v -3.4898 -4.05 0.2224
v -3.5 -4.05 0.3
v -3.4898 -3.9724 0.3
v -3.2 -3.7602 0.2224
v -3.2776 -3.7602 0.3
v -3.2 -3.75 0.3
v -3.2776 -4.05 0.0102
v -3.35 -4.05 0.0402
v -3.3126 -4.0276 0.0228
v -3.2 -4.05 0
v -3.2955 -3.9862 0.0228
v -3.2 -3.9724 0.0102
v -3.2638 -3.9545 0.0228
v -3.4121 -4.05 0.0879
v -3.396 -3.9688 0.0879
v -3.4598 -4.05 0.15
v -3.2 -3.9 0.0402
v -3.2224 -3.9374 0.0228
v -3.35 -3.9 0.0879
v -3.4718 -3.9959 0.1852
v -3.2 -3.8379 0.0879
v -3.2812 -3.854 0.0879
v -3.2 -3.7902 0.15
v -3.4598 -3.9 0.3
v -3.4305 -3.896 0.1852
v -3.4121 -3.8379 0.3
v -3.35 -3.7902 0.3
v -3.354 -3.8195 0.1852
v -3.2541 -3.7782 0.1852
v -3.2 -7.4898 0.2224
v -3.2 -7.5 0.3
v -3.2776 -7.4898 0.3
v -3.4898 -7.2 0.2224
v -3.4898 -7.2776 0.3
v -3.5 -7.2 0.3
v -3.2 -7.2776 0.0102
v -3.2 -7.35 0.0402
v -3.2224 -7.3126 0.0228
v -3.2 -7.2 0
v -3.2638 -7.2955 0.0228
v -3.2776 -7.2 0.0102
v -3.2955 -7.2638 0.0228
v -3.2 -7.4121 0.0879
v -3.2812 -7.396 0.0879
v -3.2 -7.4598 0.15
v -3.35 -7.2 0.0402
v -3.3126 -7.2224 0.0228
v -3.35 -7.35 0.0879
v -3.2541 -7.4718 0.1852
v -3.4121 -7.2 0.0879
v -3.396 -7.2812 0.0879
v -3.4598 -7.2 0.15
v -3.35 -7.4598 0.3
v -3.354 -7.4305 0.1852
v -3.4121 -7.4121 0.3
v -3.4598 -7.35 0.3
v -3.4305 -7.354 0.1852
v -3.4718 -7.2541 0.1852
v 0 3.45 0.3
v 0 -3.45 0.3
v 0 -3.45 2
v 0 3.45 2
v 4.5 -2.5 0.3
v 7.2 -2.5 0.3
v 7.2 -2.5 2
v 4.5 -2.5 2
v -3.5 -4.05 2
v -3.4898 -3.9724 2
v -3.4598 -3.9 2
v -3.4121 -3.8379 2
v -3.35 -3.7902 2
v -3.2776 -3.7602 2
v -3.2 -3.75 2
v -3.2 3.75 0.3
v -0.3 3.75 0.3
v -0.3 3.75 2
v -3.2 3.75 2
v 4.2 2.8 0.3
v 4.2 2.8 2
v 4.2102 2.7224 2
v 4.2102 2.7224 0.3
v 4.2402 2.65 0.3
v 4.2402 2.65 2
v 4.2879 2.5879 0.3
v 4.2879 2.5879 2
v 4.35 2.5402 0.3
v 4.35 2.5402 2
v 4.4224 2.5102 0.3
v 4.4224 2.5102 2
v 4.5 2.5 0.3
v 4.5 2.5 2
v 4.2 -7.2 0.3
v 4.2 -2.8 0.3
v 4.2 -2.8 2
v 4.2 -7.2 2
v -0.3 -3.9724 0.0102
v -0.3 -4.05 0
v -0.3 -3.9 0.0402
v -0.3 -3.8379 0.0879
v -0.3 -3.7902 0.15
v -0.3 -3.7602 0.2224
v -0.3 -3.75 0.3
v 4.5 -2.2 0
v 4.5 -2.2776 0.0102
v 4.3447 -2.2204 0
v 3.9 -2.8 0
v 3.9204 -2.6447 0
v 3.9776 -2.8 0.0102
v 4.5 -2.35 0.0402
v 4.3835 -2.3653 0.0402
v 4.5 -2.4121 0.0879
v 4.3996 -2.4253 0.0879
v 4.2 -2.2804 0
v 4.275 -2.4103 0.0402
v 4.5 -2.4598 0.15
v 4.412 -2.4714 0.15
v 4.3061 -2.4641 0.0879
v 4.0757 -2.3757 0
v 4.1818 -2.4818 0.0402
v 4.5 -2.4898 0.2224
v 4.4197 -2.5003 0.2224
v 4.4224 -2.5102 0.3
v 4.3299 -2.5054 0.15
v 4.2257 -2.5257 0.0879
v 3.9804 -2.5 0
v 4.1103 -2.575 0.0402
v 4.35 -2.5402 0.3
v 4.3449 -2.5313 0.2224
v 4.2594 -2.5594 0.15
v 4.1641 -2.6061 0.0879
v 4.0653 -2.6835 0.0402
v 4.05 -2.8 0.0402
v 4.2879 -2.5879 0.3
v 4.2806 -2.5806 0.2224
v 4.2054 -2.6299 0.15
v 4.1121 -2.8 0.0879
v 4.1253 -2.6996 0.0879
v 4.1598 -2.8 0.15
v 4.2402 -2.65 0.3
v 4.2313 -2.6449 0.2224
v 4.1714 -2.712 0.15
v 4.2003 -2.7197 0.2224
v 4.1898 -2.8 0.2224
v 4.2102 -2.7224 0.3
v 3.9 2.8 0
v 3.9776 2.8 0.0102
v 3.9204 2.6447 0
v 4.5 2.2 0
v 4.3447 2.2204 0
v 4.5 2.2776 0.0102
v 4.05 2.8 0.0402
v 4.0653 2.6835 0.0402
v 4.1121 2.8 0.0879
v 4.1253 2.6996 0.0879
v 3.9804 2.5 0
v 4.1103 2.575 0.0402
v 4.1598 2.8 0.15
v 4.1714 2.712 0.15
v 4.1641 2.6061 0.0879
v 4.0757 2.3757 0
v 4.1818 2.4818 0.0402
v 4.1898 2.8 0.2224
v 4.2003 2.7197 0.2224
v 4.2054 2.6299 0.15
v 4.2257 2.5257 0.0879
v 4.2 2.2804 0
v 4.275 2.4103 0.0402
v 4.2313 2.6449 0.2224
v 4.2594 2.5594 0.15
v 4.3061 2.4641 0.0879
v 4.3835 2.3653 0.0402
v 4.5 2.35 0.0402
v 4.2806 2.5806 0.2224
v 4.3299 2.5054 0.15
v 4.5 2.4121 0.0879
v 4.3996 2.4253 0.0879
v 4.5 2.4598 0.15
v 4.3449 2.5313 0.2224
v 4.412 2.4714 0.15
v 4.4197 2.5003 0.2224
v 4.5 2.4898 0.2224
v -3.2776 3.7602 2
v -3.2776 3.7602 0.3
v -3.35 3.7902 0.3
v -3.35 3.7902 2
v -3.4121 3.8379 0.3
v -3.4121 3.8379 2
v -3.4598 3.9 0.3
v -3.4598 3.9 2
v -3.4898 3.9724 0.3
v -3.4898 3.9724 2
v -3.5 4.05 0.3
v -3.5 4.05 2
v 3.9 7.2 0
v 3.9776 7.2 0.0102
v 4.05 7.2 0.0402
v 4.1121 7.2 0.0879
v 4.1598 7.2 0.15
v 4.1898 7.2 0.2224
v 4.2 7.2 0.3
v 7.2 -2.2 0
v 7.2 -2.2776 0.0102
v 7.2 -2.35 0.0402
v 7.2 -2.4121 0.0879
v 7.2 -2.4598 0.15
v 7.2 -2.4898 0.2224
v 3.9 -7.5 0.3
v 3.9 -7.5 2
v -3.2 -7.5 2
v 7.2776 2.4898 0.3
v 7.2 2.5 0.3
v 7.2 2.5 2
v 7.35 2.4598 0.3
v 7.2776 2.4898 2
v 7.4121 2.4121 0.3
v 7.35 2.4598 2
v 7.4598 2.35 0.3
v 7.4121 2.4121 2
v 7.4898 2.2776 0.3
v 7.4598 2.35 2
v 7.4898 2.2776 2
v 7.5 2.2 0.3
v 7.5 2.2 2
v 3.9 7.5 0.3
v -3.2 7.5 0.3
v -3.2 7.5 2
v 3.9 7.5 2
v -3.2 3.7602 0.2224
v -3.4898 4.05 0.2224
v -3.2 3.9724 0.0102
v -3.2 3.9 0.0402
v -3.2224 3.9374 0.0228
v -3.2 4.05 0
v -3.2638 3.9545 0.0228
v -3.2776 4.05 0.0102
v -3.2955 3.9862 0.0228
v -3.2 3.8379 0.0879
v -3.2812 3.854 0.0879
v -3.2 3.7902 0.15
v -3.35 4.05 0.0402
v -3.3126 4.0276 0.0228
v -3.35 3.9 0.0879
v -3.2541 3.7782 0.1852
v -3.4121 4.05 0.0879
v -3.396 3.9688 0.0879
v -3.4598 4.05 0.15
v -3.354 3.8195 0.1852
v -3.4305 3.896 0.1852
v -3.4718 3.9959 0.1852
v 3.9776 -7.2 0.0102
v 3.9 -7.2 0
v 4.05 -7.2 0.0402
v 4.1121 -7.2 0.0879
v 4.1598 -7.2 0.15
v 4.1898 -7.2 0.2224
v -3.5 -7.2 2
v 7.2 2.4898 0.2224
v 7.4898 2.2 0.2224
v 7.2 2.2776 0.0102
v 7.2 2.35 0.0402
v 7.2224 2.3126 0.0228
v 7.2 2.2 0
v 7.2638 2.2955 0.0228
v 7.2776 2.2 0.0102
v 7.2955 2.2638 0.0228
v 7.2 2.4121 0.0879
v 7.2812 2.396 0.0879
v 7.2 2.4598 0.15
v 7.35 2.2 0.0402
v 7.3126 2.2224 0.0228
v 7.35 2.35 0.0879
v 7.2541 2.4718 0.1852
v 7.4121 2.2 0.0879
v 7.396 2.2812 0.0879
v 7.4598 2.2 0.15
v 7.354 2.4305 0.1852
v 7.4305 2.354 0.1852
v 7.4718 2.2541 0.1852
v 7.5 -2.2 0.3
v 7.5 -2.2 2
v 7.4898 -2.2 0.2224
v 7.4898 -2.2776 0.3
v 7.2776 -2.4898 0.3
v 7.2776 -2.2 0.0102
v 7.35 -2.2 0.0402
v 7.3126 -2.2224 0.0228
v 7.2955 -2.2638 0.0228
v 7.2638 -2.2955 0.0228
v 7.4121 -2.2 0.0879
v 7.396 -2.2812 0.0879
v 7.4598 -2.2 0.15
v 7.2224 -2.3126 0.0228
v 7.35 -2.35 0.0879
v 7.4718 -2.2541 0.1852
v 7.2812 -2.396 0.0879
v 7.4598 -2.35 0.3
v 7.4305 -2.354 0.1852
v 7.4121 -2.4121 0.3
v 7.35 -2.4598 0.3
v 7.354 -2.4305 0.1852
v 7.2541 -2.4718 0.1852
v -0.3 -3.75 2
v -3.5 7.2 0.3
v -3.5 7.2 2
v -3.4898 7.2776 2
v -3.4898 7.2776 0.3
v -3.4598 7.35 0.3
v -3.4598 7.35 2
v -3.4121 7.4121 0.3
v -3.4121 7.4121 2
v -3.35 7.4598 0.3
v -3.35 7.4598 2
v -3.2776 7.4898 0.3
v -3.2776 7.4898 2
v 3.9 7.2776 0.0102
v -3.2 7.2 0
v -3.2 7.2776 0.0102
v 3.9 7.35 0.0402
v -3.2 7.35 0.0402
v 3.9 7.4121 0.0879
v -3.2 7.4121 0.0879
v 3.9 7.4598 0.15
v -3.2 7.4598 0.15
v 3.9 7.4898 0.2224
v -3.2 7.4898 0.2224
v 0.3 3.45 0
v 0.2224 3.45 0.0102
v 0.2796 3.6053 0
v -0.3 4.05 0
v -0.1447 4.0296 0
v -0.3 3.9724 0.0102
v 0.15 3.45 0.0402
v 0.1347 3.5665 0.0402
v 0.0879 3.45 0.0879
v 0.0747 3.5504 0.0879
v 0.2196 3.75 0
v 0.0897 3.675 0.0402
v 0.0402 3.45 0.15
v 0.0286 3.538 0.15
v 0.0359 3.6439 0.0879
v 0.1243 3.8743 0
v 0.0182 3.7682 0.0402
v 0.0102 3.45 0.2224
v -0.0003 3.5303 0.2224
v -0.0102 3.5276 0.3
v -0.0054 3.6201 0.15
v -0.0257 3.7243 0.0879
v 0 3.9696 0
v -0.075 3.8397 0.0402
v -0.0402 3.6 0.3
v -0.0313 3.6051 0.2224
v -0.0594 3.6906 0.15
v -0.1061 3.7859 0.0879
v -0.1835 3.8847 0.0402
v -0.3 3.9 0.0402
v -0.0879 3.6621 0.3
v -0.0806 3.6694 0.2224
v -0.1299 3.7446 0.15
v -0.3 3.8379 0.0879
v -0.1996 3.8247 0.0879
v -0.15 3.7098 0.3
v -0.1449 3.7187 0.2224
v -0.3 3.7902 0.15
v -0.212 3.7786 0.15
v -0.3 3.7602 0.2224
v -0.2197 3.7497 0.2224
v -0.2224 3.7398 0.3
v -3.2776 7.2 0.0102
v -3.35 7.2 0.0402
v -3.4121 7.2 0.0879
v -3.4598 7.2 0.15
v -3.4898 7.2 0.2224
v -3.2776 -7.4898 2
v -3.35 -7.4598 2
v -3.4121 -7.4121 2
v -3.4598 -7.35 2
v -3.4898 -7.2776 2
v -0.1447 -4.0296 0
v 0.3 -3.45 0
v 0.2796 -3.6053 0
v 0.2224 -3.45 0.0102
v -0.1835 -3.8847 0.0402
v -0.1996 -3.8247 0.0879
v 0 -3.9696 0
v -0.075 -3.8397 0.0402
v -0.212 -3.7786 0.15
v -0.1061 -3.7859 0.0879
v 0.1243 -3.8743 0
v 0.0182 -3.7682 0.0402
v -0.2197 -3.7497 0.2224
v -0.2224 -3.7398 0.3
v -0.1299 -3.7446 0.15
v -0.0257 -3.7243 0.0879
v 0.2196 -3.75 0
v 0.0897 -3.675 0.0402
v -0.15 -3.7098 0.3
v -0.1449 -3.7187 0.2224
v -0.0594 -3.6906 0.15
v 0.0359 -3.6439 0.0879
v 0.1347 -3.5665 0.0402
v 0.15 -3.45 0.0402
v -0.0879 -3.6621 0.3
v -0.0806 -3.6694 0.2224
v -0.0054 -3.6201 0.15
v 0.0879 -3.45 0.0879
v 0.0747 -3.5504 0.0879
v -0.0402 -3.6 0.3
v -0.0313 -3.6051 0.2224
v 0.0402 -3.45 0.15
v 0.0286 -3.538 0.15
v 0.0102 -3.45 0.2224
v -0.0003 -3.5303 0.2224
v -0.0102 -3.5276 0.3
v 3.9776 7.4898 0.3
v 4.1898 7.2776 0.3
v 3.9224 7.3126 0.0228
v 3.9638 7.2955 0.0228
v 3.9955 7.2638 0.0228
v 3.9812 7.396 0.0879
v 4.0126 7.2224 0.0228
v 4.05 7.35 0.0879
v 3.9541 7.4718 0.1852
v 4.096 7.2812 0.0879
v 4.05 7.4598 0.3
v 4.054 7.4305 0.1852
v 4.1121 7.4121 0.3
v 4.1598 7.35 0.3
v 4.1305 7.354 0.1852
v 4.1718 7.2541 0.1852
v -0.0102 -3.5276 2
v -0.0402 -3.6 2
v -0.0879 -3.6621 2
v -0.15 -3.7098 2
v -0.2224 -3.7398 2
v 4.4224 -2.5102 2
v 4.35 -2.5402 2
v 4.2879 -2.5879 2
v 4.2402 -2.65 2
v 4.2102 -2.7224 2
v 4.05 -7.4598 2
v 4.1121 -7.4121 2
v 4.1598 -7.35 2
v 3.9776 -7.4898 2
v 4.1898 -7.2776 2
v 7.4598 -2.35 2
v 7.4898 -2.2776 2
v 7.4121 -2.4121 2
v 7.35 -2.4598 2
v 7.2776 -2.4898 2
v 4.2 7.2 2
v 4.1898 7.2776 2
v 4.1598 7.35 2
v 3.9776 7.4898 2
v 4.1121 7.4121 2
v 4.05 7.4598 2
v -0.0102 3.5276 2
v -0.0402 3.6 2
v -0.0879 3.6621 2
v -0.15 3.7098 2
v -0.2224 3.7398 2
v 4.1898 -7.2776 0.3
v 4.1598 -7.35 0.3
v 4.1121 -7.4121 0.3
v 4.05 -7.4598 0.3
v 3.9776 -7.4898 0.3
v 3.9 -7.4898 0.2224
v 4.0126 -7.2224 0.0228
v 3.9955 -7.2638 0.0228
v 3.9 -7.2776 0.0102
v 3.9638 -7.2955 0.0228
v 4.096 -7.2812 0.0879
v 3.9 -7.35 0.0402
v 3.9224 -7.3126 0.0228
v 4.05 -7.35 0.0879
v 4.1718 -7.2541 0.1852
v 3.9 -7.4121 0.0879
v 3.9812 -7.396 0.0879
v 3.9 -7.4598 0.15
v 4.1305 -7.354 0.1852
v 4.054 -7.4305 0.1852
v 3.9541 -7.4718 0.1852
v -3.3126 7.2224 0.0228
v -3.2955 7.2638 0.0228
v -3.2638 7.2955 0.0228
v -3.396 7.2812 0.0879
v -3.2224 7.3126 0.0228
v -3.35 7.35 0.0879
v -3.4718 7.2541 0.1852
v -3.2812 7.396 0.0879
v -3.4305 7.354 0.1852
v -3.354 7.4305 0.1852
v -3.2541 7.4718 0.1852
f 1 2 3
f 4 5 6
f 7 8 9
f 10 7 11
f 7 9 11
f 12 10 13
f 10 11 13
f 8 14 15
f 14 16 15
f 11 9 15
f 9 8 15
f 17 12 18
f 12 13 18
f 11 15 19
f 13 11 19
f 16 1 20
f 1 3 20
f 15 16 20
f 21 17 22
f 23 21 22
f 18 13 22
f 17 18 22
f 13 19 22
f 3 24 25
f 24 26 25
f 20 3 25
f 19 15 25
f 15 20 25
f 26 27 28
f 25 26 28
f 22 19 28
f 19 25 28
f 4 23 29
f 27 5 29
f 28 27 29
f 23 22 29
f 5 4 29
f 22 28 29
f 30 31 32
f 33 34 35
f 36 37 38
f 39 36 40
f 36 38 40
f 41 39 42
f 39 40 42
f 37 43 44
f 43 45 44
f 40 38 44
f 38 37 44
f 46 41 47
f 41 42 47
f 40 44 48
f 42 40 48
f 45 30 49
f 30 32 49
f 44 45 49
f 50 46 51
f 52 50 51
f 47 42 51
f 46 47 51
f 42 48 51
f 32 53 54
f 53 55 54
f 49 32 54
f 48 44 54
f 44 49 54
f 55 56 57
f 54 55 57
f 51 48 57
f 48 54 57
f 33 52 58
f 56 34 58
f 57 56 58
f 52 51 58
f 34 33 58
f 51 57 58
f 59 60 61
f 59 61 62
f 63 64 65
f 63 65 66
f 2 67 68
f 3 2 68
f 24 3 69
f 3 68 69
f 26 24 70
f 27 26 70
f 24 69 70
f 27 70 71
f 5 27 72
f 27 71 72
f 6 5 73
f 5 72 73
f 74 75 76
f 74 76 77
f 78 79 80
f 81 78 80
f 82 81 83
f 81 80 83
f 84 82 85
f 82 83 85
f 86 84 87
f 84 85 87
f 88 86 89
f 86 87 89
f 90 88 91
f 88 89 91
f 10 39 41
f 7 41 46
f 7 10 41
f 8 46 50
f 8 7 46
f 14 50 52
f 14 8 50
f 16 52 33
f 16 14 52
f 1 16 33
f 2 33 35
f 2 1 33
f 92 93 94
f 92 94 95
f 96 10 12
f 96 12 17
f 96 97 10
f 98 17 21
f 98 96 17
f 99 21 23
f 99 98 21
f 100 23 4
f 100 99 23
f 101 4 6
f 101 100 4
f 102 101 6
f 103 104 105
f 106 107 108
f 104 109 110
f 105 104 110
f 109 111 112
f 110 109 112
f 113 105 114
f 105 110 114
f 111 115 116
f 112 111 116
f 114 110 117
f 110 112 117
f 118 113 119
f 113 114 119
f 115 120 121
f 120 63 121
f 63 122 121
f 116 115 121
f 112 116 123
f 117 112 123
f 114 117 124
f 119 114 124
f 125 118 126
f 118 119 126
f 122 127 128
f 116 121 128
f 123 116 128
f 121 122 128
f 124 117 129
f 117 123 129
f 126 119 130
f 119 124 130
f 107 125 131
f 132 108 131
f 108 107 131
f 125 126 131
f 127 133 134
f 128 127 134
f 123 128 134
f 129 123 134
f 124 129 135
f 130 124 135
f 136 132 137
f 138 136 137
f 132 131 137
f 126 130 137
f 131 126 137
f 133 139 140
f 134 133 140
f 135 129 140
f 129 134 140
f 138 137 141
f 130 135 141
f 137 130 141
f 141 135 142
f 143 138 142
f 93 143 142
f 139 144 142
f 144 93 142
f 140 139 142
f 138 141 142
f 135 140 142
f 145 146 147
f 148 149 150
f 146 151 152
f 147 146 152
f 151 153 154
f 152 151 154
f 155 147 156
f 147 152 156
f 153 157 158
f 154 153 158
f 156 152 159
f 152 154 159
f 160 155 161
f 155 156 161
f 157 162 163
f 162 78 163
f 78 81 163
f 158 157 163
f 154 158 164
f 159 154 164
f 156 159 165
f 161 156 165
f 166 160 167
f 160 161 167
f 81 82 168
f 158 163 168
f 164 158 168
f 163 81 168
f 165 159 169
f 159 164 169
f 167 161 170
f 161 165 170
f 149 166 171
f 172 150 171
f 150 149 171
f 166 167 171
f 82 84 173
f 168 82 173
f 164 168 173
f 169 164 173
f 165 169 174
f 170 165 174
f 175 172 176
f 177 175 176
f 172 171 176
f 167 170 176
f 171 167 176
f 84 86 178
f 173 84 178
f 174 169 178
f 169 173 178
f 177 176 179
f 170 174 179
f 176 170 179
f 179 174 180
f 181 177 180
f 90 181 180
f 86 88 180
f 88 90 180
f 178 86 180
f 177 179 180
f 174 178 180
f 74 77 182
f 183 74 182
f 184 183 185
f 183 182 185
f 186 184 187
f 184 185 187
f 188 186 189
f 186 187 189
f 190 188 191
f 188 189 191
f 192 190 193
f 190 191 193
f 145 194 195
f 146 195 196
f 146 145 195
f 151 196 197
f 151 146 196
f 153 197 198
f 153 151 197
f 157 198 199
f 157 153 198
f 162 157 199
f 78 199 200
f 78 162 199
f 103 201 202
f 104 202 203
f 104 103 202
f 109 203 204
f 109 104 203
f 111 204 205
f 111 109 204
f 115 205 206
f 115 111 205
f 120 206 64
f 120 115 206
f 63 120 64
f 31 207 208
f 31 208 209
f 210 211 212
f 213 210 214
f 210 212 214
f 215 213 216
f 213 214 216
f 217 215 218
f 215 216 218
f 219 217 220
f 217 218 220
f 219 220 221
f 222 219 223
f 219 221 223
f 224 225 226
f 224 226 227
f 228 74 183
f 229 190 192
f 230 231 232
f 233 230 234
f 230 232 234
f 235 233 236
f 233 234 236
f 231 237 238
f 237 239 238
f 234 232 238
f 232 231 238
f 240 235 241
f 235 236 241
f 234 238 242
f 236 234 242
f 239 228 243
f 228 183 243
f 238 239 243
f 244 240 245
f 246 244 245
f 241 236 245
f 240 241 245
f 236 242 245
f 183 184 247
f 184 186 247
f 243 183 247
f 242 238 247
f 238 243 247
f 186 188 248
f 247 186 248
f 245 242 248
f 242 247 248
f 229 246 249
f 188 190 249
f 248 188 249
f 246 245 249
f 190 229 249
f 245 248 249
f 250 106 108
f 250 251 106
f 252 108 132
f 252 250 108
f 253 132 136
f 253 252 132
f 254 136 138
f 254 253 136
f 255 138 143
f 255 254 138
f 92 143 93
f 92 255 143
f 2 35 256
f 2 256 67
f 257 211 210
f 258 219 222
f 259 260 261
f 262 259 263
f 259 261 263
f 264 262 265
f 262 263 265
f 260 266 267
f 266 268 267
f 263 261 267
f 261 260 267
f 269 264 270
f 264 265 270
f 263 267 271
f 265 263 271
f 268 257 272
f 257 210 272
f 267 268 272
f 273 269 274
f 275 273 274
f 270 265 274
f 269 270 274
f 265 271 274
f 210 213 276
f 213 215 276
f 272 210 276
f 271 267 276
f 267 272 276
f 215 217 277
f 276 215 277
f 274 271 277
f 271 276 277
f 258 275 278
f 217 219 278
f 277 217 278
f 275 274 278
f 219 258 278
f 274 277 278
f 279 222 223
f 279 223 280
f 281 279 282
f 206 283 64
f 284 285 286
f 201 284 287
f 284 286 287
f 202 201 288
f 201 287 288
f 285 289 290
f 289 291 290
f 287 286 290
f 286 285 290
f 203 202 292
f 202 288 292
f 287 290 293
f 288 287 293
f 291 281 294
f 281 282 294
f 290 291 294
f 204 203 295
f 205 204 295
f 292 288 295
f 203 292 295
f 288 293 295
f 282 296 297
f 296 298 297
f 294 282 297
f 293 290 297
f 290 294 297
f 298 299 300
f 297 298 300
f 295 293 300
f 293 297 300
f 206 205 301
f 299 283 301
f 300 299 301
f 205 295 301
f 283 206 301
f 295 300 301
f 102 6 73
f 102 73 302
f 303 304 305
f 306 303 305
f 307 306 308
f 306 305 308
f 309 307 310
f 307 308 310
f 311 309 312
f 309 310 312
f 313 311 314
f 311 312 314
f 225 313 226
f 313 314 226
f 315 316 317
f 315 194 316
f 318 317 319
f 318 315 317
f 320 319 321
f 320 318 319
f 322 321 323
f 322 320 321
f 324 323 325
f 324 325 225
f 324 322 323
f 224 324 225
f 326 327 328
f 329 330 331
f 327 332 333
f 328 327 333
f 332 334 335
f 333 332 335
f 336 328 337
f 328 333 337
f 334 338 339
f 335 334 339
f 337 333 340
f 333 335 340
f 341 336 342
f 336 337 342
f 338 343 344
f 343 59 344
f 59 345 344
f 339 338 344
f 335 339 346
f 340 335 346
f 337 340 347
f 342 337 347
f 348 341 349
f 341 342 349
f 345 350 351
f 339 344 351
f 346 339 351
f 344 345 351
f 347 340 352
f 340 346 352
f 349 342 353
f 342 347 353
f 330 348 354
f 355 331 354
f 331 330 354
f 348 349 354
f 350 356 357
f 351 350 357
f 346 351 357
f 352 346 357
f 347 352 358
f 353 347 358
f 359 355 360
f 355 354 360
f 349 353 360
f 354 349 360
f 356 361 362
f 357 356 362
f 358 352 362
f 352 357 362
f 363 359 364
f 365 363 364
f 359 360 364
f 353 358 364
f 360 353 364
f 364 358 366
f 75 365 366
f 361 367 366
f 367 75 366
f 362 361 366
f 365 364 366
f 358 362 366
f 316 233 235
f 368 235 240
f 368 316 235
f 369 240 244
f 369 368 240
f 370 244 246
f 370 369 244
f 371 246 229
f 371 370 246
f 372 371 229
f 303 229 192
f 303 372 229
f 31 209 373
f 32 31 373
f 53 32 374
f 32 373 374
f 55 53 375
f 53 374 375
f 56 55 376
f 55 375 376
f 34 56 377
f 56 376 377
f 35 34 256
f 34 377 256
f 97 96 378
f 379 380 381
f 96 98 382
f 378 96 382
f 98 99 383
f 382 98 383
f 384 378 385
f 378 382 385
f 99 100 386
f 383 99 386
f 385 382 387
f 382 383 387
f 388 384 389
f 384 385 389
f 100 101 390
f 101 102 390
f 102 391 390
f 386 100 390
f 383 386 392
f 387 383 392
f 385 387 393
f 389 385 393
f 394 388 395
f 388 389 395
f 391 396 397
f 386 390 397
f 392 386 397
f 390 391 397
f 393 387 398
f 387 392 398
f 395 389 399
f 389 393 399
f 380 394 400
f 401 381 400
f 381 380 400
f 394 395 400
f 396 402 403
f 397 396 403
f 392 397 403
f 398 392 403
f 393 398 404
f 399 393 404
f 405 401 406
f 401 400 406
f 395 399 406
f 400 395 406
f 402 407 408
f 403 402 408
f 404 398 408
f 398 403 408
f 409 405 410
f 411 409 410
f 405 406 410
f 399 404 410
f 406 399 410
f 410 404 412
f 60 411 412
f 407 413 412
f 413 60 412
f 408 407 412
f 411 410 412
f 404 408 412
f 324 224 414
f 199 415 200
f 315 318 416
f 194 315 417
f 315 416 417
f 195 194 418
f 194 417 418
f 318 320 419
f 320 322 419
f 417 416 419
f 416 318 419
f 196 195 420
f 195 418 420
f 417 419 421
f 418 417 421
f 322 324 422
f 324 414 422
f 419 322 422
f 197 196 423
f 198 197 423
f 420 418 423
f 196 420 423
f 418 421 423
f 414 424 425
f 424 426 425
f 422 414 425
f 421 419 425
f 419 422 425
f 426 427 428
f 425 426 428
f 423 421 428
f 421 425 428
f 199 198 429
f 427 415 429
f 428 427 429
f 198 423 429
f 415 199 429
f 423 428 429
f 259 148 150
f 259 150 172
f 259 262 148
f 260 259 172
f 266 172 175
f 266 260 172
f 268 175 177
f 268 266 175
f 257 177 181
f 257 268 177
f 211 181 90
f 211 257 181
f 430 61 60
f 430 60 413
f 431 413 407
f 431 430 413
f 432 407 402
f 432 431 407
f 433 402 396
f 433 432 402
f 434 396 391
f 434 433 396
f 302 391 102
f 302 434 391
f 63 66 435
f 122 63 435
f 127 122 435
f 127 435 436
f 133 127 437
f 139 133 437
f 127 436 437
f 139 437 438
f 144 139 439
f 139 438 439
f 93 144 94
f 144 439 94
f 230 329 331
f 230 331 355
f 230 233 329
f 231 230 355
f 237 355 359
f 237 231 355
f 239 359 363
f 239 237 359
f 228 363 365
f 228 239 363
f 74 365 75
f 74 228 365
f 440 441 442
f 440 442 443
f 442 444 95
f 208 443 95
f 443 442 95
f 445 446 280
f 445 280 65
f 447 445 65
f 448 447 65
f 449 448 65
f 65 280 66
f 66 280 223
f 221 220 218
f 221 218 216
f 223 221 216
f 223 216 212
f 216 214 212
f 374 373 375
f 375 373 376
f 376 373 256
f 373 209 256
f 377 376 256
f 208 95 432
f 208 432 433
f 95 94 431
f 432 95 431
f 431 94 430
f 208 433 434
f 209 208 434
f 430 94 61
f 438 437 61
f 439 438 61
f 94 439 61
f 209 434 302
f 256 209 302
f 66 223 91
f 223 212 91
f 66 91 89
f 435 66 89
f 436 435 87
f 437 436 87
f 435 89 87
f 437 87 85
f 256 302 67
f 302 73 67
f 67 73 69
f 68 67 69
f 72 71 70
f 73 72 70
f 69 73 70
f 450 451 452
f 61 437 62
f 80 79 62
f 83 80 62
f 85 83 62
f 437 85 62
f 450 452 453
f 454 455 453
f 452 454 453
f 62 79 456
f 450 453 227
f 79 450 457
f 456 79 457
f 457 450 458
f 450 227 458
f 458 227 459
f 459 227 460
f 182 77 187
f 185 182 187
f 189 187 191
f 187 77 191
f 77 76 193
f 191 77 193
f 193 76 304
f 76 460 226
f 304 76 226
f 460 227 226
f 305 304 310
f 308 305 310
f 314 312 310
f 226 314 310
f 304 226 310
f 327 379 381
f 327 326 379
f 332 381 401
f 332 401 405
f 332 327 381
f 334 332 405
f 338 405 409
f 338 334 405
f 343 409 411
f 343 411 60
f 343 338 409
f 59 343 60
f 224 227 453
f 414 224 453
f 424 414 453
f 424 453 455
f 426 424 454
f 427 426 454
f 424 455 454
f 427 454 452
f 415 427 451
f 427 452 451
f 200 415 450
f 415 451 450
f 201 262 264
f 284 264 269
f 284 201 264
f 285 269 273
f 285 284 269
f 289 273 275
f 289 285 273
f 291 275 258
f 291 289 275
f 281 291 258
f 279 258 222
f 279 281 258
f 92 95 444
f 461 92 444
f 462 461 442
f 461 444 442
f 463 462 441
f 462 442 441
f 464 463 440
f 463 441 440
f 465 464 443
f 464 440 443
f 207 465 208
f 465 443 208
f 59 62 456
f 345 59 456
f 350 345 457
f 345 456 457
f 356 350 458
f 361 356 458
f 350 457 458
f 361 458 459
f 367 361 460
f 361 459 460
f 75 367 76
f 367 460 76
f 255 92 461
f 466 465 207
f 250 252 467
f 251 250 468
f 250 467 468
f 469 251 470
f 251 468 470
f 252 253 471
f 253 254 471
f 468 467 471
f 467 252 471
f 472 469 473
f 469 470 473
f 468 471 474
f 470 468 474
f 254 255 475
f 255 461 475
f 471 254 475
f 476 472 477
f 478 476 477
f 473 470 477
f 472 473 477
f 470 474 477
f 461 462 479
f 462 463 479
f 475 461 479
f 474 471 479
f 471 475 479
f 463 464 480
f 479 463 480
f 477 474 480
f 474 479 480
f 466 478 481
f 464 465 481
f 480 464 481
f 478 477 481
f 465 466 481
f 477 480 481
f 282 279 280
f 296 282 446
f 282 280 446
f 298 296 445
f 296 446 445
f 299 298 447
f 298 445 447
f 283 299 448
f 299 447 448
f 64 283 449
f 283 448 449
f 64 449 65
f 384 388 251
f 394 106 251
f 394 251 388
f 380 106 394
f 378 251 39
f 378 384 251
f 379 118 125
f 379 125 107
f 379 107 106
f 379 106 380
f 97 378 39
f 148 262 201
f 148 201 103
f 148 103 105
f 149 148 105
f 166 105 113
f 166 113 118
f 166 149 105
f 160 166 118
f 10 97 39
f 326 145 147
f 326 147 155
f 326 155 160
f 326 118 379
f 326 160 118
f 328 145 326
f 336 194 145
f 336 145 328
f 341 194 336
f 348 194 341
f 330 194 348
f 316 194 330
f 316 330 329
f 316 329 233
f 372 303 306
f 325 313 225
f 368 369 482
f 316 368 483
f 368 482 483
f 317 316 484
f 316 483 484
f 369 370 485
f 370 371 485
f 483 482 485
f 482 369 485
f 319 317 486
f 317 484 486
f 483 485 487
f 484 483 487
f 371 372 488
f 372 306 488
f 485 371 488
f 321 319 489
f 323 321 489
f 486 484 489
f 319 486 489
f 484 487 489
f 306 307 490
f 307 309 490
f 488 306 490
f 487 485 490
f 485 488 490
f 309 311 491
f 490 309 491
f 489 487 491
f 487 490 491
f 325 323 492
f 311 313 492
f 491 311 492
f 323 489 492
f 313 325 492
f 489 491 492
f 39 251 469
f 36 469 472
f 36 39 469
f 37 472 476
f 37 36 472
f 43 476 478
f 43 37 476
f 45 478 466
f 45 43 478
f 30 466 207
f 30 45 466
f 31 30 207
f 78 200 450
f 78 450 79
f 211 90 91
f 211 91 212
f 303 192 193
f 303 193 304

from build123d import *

# Parameters (mm, degrees)
GRUNDK_RPER_DEPTH = 2
VERRUNDUNG1_R     = 0.3
VERRUNDUNG2_R     = 0.3


with BuildPart() as part:
    # Skizze1 → Grundkörper (new body)
    with BuildSketch(Plane.XY):
        Polygon((0, -3.75), (0, 3.75), (-3.5, 3.75), (-3.5, 7.5), (4.2, 7.5), (4.2, 2.5), (7.5, 2.5), (7.5, -2.5), (4.2, -2.5), (4.2, -7.5), (-3.5, -7.5), (-3.5, -3.75), align=None)
    extrude(amount=GRUNDK_RPER_DEPTH)

    # Verrundung1
    verrundung1_edges = [part.edges().sort_by_distance(p)[0] for p in [
        (4.2, 7.5, 1),
        (4.2, 2.5, 1),
        (7.5, 2.5, 1),
        (7.5, -2.5, 1),
        (4.2, -2.5, 1),
        (4.2, -7.5, 1),
        (-3.5, -7.5, 1),
        (-3.5, -3.75, 1),
        (0, -3.75, 1),
        (0, 3.75, 1),
        (-3.5, 3.75, 1),
        (-3.5, 7.5, 1),
    ]]
    fillet(verrundung1_edges, radius=VERRUNDUNG1_R)

    # Verrundung2
    verrundung2_edges = [part.edges().sort_by_distance(p)[0] for p in [
        (0.35, 7.5, 0),
        (4.2, 5, 0),
        (5.85, 2.5, 0),
        (7.5, 0, 0),
        (5.85, -2.5, 0),
        (4.2, -5, 0),
        (0.35, -7.5, 0),
        (-3.5, -5.625, 0),
        (-1.75, -3.75, 0),
        (0, 0, 0),
        (-1.75, 3.75, 0),
        (-3.5, 5.625, 0),
        (7.412132034, -2.412132034, 0),
        (4.112132034, -7.412132034, 0),
        (-3.412132034, -7.412132034, 0),
        (-3.412132034, -3.837867966, 0),
        (-3.412132034, 3.837867966, 0),
        (-3.412132034, 7.412132034, 0),
        (7.412132034, 2.412132034, 0),
        (4.112132034, 7.412132034, 0),
        (4.287867966, 2.587867966, 0),
        (-0.087867966, 3.662132034, 0),
        (-0.087867966, -3.662132034, 0),
        (4.287867966, -2.587867966, 0),
    ]]
    fillet(verrundung2_edges, radius=VERRUNDUNG2_R)


solid = part.part
